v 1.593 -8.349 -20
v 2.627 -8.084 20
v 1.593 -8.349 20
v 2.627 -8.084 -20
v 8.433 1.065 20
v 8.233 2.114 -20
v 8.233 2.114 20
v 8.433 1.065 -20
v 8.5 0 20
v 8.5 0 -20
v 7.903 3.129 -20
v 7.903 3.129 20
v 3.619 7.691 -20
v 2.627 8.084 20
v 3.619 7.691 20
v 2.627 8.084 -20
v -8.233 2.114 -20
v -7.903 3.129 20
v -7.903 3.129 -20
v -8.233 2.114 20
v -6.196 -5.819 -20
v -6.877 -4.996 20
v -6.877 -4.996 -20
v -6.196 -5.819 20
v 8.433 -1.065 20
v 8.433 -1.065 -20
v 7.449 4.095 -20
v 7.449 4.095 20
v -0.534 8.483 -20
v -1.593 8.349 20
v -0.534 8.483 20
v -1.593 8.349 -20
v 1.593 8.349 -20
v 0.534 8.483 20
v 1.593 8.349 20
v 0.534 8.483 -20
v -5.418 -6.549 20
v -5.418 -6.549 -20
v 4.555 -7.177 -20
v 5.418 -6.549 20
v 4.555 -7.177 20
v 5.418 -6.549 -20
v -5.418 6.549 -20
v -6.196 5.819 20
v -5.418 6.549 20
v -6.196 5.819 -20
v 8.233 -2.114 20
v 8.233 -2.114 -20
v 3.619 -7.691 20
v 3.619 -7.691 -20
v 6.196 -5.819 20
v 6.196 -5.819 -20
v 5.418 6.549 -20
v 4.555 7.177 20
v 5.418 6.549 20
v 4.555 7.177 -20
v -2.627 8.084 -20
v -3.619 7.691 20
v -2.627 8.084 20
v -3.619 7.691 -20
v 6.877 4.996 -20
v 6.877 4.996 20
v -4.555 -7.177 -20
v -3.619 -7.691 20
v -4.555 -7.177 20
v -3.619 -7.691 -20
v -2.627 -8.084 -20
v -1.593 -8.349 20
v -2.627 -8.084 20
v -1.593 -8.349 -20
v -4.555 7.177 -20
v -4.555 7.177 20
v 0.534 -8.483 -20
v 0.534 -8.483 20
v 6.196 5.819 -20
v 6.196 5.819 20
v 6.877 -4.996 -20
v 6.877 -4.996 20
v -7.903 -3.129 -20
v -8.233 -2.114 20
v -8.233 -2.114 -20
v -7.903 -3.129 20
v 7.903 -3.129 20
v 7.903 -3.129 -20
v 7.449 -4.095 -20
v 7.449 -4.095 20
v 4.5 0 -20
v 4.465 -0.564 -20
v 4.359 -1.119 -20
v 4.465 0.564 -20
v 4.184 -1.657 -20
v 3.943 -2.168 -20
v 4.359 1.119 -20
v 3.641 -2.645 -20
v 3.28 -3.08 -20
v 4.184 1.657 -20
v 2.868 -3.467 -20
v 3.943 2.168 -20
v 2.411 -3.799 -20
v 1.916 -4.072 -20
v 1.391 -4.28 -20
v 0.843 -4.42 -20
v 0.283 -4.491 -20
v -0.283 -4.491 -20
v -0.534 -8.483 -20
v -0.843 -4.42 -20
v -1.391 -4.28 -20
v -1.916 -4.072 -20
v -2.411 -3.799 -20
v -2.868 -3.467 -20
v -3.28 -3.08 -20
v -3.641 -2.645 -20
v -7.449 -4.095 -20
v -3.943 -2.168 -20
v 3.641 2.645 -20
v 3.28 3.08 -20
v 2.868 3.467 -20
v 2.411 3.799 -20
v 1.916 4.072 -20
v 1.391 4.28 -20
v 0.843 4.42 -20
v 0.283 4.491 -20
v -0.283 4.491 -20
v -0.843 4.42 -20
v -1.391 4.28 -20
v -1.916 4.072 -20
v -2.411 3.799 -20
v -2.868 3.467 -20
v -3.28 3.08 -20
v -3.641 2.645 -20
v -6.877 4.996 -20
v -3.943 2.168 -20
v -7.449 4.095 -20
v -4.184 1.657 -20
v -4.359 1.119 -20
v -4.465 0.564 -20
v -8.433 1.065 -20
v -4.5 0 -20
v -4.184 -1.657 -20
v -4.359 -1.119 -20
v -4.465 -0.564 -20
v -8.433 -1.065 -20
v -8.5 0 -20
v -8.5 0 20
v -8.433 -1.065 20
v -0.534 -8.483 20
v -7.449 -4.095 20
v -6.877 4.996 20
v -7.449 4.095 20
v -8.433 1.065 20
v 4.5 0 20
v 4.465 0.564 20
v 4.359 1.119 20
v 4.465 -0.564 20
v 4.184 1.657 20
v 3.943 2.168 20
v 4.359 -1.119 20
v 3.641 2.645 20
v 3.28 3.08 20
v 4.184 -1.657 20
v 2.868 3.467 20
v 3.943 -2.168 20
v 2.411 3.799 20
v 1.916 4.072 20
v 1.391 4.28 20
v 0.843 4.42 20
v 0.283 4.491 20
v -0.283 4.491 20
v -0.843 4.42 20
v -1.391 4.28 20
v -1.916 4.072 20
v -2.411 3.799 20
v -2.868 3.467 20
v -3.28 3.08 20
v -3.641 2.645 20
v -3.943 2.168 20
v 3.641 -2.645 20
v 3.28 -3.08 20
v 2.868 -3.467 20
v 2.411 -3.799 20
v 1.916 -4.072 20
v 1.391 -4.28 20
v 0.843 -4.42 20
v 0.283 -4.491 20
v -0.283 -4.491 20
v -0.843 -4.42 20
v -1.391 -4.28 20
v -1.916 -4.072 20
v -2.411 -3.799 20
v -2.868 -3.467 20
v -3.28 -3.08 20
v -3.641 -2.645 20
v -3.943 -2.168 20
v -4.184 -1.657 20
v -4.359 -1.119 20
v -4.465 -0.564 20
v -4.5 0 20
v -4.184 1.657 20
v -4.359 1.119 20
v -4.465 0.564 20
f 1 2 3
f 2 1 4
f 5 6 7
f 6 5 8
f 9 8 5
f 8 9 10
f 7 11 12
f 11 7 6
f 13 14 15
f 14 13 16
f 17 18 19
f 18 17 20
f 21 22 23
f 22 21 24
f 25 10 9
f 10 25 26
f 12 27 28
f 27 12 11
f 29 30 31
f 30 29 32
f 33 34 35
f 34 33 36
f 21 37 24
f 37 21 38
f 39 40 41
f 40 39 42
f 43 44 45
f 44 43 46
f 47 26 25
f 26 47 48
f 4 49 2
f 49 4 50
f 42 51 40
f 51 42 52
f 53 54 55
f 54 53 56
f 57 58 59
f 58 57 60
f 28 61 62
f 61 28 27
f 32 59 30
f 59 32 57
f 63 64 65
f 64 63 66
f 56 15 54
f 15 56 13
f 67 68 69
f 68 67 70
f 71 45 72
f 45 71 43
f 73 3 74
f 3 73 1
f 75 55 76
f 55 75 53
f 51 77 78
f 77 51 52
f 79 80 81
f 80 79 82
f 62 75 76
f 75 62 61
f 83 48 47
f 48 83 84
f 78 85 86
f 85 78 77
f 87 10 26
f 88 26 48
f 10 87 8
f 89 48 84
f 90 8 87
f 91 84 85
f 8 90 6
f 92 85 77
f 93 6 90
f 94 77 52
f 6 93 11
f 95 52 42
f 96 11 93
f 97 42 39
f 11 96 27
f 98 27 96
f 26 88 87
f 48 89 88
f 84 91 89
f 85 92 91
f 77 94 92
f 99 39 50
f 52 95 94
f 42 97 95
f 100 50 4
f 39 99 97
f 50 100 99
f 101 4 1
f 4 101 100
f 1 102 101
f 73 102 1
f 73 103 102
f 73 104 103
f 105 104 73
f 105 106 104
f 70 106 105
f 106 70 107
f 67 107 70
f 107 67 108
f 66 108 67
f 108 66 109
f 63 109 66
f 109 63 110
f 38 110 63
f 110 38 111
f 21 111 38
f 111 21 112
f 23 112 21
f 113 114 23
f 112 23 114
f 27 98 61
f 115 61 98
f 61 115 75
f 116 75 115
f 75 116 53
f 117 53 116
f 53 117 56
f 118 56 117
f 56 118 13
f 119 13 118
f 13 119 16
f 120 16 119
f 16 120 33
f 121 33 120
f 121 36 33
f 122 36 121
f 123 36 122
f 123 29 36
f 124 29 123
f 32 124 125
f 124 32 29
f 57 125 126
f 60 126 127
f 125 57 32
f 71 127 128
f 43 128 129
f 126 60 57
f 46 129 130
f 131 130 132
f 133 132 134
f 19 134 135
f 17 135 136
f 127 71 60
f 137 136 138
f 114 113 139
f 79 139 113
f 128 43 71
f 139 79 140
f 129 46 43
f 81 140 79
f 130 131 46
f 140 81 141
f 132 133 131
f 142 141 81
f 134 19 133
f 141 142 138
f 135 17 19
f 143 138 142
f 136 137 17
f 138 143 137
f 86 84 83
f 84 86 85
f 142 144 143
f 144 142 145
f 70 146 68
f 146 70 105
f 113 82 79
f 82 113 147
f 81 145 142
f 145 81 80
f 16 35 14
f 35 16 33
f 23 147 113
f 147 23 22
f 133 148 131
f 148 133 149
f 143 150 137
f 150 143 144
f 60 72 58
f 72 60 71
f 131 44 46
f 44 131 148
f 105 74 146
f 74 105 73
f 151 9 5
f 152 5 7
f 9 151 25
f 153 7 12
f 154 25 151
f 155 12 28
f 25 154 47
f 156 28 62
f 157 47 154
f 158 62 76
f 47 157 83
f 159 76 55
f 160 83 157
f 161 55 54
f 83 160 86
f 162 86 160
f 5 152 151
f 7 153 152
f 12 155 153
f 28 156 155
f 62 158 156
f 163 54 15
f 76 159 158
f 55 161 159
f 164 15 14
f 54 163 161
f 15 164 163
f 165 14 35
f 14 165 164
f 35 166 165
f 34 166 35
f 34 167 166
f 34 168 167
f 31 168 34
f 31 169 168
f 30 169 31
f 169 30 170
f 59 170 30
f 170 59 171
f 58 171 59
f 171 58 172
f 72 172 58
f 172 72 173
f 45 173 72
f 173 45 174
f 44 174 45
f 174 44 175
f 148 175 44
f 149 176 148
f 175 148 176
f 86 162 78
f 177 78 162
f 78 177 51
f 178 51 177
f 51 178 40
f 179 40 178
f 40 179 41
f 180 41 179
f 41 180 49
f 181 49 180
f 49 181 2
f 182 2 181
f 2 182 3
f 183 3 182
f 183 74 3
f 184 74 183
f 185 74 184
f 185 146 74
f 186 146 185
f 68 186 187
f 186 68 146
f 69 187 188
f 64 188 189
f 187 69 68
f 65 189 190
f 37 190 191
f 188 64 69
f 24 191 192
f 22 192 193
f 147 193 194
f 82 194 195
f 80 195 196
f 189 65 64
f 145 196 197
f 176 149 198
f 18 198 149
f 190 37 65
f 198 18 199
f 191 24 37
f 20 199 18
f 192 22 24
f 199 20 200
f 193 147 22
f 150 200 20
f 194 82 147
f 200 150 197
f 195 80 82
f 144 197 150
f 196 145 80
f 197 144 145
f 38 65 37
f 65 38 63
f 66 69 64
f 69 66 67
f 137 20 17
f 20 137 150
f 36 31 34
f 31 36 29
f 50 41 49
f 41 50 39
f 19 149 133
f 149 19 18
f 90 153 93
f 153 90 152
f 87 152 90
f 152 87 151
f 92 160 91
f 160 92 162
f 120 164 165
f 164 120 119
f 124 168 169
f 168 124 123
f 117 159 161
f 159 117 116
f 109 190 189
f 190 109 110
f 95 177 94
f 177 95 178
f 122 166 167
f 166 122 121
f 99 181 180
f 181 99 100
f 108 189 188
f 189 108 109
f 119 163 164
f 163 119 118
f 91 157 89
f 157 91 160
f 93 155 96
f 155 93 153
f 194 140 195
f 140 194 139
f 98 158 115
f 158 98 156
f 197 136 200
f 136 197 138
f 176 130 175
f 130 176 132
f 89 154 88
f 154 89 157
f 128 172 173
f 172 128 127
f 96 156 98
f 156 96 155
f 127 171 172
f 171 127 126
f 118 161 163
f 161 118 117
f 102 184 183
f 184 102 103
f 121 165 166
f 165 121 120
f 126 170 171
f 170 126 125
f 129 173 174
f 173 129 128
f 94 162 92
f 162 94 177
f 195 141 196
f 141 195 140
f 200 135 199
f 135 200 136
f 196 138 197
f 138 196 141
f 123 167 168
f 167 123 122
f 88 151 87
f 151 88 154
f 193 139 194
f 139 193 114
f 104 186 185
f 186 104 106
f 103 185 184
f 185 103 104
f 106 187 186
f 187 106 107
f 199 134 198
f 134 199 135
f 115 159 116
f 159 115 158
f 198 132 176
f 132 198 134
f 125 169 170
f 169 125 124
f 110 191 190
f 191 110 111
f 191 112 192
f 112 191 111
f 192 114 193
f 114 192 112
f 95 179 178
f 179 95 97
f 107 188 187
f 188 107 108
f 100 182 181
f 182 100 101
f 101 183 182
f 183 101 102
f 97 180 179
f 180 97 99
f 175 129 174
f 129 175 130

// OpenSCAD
$fn = 50;


difference() {
	union() {
		translate(v = [0, 0, -20.0000000000]) {
			cylinder(h = 40, r = 8.5000000000);
		}
	}
	union() {
		translate(v = [0, 0, -100.0000000000]) {
			cylinder(h = 200, r = 4.5000000000);
		}
	}
}
